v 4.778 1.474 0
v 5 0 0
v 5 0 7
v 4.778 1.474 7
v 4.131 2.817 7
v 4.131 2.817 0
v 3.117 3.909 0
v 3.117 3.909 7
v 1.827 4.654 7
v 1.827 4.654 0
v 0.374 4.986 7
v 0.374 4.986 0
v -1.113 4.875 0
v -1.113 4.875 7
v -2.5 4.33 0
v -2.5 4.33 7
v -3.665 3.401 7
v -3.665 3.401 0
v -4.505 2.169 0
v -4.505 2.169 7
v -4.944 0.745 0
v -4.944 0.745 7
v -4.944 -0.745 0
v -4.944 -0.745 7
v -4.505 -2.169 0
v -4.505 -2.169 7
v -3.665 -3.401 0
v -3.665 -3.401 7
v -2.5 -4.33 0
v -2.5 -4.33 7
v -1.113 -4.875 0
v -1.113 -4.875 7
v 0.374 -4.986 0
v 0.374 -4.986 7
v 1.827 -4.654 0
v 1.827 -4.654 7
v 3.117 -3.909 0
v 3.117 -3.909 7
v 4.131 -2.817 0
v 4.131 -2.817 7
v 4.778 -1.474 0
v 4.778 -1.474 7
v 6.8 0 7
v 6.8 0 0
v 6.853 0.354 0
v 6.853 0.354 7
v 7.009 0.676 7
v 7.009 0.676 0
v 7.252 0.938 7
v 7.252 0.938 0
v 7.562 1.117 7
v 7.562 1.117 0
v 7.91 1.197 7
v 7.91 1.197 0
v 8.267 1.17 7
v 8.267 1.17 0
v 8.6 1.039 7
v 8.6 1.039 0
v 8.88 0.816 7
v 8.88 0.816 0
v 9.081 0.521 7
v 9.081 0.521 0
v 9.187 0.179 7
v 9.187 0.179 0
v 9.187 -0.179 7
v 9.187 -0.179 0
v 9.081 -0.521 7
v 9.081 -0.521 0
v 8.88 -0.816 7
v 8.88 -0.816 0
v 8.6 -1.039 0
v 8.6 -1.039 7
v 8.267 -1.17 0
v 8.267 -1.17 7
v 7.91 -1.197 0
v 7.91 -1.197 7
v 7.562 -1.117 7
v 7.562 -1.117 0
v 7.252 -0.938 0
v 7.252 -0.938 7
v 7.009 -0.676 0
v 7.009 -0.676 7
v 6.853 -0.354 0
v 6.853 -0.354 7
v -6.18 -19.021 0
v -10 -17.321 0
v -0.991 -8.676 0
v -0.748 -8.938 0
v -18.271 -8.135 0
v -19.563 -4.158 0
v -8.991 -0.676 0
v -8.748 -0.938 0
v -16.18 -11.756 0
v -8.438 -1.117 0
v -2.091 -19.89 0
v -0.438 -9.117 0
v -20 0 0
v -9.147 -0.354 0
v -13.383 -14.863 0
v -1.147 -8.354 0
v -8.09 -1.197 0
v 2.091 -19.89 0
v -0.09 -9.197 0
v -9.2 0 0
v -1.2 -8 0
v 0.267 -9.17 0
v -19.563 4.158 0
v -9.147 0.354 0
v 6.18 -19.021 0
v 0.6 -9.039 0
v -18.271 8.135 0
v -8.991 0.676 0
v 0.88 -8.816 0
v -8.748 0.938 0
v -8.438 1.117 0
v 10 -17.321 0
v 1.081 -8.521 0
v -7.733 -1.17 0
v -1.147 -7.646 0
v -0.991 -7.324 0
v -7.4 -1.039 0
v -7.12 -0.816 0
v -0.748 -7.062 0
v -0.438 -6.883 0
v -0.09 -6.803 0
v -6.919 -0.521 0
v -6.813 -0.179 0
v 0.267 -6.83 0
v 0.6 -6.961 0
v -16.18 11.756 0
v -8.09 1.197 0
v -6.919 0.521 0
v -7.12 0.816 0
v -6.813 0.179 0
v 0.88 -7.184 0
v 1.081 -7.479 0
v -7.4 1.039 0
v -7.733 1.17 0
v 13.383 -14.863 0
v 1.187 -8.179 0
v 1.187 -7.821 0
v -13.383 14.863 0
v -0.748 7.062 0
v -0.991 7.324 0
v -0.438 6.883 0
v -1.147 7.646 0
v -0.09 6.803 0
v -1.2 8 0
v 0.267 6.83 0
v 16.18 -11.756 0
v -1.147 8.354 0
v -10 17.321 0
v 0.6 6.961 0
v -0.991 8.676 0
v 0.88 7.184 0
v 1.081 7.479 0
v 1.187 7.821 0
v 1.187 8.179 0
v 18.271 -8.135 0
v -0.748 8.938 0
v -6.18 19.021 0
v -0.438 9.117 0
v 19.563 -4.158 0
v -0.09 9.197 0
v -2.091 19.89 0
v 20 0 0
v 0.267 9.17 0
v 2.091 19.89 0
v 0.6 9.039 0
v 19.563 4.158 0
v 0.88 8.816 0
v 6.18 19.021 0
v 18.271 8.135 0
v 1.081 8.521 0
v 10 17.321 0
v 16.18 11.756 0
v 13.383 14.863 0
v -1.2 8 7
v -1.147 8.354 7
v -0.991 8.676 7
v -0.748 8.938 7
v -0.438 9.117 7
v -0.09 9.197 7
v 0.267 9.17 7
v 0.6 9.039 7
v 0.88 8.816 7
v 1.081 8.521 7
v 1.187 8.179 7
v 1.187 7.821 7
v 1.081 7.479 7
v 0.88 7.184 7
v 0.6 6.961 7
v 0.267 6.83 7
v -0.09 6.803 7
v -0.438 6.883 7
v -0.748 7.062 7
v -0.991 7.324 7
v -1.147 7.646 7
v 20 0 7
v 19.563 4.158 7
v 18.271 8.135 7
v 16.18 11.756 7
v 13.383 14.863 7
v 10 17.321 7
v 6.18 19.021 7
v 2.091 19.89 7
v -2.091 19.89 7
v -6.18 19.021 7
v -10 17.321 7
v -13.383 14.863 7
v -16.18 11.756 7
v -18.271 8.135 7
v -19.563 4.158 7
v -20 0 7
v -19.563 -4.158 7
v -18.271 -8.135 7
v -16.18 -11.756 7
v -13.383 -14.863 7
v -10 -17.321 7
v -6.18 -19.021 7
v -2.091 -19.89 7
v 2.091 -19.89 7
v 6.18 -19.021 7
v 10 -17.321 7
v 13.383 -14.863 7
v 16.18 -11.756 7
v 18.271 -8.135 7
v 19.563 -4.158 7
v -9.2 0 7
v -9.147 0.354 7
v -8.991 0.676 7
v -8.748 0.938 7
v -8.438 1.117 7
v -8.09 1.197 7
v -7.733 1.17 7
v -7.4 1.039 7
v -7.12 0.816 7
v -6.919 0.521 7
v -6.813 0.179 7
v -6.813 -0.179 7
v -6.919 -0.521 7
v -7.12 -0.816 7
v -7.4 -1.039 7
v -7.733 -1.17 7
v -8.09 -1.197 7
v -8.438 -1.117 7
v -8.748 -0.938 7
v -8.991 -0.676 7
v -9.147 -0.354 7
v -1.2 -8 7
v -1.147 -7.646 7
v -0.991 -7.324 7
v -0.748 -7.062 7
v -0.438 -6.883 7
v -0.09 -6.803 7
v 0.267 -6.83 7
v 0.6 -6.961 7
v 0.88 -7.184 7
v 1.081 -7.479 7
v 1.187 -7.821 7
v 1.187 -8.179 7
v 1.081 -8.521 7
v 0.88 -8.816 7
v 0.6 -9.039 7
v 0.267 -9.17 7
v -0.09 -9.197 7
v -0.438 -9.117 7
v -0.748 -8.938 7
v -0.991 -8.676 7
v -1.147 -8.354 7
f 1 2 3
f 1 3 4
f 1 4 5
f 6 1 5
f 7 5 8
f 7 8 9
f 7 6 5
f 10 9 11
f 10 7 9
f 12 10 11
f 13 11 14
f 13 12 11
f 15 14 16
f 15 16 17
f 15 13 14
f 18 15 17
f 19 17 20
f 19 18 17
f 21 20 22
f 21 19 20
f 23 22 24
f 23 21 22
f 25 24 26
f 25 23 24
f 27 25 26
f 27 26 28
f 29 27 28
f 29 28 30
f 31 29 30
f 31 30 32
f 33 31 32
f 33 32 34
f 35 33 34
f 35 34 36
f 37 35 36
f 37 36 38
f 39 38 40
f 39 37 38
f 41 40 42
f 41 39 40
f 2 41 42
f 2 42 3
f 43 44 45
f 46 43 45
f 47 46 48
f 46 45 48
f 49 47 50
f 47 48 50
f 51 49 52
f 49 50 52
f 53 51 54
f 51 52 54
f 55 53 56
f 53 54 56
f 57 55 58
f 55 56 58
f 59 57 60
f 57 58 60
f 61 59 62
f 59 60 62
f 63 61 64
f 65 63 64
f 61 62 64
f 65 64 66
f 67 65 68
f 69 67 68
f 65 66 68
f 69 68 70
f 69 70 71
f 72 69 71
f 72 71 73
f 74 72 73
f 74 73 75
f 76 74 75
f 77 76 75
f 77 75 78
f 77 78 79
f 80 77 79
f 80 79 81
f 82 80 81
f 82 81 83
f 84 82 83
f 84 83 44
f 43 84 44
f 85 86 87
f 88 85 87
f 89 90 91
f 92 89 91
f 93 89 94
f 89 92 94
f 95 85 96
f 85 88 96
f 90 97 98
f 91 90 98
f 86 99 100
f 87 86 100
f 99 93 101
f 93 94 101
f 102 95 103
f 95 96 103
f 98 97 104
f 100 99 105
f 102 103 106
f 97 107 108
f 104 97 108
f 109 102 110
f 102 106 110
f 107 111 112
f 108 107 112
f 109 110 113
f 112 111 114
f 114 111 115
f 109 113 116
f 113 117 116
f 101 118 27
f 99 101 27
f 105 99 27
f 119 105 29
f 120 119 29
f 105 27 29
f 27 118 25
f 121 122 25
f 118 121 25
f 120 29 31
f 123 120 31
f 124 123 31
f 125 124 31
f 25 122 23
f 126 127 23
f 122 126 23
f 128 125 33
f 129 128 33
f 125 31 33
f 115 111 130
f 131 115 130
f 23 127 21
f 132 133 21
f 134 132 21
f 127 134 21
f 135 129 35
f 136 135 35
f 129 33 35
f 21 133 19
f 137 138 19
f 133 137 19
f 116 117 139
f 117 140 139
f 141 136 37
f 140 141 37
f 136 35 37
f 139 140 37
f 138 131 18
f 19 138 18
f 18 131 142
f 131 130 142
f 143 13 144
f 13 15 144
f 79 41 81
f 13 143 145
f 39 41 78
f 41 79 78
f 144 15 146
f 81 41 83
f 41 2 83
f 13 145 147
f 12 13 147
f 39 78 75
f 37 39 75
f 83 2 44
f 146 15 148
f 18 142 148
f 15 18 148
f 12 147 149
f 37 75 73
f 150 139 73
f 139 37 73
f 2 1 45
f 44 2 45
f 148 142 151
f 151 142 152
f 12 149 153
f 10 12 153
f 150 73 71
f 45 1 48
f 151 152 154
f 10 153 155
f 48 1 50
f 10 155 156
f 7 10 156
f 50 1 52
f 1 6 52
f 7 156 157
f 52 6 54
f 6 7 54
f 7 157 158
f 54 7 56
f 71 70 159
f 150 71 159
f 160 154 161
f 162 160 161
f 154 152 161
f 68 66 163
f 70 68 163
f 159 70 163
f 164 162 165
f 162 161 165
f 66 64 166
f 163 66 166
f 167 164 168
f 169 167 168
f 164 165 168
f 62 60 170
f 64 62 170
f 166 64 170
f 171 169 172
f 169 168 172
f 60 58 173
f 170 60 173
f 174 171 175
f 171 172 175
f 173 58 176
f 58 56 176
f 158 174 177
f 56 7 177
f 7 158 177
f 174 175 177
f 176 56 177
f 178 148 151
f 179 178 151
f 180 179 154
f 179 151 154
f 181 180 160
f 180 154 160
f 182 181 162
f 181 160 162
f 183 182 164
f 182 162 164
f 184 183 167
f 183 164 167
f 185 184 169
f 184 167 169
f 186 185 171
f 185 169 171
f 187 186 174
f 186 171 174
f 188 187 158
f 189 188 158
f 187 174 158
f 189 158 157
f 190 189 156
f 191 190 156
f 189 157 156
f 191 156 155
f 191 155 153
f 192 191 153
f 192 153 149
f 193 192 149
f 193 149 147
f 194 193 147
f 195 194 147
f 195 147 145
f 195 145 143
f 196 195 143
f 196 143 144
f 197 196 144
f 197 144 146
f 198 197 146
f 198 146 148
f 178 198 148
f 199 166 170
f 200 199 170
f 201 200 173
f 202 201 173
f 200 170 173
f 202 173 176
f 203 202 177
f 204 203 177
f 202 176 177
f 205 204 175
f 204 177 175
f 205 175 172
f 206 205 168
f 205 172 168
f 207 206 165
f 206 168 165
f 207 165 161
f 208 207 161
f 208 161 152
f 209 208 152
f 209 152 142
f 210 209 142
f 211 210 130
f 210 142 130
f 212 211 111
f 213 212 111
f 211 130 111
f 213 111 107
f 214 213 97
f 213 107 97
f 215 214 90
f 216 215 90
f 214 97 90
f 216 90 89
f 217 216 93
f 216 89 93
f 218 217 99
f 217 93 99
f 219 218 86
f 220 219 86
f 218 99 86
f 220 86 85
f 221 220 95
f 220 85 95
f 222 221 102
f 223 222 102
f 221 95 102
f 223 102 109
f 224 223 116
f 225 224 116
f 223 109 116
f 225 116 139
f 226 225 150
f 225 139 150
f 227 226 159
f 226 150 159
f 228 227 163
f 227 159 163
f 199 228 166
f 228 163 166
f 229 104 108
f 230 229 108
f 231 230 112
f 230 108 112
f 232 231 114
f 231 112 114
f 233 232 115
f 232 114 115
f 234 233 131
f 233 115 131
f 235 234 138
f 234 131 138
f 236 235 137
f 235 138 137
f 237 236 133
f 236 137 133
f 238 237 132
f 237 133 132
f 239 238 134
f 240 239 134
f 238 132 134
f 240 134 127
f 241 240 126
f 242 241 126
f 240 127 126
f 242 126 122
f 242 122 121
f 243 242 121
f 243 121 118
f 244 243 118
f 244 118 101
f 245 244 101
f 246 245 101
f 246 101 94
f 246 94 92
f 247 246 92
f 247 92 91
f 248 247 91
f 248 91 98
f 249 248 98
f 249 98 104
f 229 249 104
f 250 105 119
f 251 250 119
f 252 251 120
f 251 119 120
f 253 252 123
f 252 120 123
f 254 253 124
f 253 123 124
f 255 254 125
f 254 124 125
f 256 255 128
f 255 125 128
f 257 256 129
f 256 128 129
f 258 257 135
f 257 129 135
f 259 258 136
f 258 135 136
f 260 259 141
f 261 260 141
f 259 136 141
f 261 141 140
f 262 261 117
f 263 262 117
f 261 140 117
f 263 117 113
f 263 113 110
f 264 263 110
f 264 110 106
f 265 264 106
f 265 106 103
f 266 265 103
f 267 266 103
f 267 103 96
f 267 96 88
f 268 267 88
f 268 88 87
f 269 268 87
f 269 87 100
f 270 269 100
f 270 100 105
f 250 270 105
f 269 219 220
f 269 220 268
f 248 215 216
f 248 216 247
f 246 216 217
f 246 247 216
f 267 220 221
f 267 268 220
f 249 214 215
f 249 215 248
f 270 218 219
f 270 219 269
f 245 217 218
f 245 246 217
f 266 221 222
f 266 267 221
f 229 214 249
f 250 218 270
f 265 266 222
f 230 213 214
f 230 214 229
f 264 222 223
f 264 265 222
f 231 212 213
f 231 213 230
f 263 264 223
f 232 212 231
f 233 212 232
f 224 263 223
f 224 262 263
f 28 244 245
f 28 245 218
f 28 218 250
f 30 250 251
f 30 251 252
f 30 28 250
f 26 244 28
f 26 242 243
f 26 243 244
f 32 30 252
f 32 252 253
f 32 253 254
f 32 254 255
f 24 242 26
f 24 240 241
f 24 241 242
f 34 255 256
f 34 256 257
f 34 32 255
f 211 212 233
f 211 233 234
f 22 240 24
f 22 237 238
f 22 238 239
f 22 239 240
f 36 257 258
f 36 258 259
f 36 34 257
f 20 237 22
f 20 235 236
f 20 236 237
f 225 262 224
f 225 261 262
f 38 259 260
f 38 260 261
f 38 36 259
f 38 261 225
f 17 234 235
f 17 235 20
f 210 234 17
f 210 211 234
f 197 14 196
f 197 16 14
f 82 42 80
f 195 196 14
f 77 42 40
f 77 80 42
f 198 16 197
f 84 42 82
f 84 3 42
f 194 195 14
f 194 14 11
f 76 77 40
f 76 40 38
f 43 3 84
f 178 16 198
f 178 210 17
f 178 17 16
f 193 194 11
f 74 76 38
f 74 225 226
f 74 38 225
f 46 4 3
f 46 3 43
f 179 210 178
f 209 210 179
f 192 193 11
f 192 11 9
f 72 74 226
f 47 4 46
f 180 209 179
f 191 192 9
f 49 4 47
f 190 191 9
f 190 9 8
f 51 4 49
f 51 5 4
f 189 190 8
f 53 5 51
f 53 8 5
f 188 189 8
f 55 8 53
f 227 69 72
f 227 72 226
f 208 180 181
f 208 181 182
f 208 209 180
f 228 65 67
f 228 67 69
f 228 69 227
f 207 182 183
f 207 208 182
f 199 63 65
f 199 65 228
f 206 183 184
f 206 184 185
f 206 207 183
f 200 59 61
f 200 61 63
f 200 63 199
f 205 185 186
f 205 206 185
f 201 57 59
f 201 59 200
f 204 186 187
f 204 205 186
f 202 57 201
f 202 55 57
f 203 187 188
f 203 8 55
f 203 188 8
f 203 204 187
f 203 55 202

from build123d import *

# Parameters (mm, degrees)
ESQUISSE1_R        = 20
ESQUISSE1_R_2      = 5
BOSS_EXTRU_1_DEPTH = 7
D_GAGEMENT_M21_D   = 2.4


with BuildPart() as part:
    # Esquisse1 → Boss.-Extru.1 (new body)
    with BuildSketch(Plane.XY):
        Circle(ESQUISSE1_R)
        Circle(ESQUISSE1_R_2, mode=Mode.SUBTRACT)
    extrude(amount=BOSS_EXTRU_1_DEPTH)

    # Dégagement M21 (through all)
    with Locations(Plane.XY.offset(7)):
        with Locations((0, 8), (8, 0), (0, -8), (-8, 0), (0, 0)):
            Hole(D_GAGEMENT_M21_D / 2)


solid = part.part
